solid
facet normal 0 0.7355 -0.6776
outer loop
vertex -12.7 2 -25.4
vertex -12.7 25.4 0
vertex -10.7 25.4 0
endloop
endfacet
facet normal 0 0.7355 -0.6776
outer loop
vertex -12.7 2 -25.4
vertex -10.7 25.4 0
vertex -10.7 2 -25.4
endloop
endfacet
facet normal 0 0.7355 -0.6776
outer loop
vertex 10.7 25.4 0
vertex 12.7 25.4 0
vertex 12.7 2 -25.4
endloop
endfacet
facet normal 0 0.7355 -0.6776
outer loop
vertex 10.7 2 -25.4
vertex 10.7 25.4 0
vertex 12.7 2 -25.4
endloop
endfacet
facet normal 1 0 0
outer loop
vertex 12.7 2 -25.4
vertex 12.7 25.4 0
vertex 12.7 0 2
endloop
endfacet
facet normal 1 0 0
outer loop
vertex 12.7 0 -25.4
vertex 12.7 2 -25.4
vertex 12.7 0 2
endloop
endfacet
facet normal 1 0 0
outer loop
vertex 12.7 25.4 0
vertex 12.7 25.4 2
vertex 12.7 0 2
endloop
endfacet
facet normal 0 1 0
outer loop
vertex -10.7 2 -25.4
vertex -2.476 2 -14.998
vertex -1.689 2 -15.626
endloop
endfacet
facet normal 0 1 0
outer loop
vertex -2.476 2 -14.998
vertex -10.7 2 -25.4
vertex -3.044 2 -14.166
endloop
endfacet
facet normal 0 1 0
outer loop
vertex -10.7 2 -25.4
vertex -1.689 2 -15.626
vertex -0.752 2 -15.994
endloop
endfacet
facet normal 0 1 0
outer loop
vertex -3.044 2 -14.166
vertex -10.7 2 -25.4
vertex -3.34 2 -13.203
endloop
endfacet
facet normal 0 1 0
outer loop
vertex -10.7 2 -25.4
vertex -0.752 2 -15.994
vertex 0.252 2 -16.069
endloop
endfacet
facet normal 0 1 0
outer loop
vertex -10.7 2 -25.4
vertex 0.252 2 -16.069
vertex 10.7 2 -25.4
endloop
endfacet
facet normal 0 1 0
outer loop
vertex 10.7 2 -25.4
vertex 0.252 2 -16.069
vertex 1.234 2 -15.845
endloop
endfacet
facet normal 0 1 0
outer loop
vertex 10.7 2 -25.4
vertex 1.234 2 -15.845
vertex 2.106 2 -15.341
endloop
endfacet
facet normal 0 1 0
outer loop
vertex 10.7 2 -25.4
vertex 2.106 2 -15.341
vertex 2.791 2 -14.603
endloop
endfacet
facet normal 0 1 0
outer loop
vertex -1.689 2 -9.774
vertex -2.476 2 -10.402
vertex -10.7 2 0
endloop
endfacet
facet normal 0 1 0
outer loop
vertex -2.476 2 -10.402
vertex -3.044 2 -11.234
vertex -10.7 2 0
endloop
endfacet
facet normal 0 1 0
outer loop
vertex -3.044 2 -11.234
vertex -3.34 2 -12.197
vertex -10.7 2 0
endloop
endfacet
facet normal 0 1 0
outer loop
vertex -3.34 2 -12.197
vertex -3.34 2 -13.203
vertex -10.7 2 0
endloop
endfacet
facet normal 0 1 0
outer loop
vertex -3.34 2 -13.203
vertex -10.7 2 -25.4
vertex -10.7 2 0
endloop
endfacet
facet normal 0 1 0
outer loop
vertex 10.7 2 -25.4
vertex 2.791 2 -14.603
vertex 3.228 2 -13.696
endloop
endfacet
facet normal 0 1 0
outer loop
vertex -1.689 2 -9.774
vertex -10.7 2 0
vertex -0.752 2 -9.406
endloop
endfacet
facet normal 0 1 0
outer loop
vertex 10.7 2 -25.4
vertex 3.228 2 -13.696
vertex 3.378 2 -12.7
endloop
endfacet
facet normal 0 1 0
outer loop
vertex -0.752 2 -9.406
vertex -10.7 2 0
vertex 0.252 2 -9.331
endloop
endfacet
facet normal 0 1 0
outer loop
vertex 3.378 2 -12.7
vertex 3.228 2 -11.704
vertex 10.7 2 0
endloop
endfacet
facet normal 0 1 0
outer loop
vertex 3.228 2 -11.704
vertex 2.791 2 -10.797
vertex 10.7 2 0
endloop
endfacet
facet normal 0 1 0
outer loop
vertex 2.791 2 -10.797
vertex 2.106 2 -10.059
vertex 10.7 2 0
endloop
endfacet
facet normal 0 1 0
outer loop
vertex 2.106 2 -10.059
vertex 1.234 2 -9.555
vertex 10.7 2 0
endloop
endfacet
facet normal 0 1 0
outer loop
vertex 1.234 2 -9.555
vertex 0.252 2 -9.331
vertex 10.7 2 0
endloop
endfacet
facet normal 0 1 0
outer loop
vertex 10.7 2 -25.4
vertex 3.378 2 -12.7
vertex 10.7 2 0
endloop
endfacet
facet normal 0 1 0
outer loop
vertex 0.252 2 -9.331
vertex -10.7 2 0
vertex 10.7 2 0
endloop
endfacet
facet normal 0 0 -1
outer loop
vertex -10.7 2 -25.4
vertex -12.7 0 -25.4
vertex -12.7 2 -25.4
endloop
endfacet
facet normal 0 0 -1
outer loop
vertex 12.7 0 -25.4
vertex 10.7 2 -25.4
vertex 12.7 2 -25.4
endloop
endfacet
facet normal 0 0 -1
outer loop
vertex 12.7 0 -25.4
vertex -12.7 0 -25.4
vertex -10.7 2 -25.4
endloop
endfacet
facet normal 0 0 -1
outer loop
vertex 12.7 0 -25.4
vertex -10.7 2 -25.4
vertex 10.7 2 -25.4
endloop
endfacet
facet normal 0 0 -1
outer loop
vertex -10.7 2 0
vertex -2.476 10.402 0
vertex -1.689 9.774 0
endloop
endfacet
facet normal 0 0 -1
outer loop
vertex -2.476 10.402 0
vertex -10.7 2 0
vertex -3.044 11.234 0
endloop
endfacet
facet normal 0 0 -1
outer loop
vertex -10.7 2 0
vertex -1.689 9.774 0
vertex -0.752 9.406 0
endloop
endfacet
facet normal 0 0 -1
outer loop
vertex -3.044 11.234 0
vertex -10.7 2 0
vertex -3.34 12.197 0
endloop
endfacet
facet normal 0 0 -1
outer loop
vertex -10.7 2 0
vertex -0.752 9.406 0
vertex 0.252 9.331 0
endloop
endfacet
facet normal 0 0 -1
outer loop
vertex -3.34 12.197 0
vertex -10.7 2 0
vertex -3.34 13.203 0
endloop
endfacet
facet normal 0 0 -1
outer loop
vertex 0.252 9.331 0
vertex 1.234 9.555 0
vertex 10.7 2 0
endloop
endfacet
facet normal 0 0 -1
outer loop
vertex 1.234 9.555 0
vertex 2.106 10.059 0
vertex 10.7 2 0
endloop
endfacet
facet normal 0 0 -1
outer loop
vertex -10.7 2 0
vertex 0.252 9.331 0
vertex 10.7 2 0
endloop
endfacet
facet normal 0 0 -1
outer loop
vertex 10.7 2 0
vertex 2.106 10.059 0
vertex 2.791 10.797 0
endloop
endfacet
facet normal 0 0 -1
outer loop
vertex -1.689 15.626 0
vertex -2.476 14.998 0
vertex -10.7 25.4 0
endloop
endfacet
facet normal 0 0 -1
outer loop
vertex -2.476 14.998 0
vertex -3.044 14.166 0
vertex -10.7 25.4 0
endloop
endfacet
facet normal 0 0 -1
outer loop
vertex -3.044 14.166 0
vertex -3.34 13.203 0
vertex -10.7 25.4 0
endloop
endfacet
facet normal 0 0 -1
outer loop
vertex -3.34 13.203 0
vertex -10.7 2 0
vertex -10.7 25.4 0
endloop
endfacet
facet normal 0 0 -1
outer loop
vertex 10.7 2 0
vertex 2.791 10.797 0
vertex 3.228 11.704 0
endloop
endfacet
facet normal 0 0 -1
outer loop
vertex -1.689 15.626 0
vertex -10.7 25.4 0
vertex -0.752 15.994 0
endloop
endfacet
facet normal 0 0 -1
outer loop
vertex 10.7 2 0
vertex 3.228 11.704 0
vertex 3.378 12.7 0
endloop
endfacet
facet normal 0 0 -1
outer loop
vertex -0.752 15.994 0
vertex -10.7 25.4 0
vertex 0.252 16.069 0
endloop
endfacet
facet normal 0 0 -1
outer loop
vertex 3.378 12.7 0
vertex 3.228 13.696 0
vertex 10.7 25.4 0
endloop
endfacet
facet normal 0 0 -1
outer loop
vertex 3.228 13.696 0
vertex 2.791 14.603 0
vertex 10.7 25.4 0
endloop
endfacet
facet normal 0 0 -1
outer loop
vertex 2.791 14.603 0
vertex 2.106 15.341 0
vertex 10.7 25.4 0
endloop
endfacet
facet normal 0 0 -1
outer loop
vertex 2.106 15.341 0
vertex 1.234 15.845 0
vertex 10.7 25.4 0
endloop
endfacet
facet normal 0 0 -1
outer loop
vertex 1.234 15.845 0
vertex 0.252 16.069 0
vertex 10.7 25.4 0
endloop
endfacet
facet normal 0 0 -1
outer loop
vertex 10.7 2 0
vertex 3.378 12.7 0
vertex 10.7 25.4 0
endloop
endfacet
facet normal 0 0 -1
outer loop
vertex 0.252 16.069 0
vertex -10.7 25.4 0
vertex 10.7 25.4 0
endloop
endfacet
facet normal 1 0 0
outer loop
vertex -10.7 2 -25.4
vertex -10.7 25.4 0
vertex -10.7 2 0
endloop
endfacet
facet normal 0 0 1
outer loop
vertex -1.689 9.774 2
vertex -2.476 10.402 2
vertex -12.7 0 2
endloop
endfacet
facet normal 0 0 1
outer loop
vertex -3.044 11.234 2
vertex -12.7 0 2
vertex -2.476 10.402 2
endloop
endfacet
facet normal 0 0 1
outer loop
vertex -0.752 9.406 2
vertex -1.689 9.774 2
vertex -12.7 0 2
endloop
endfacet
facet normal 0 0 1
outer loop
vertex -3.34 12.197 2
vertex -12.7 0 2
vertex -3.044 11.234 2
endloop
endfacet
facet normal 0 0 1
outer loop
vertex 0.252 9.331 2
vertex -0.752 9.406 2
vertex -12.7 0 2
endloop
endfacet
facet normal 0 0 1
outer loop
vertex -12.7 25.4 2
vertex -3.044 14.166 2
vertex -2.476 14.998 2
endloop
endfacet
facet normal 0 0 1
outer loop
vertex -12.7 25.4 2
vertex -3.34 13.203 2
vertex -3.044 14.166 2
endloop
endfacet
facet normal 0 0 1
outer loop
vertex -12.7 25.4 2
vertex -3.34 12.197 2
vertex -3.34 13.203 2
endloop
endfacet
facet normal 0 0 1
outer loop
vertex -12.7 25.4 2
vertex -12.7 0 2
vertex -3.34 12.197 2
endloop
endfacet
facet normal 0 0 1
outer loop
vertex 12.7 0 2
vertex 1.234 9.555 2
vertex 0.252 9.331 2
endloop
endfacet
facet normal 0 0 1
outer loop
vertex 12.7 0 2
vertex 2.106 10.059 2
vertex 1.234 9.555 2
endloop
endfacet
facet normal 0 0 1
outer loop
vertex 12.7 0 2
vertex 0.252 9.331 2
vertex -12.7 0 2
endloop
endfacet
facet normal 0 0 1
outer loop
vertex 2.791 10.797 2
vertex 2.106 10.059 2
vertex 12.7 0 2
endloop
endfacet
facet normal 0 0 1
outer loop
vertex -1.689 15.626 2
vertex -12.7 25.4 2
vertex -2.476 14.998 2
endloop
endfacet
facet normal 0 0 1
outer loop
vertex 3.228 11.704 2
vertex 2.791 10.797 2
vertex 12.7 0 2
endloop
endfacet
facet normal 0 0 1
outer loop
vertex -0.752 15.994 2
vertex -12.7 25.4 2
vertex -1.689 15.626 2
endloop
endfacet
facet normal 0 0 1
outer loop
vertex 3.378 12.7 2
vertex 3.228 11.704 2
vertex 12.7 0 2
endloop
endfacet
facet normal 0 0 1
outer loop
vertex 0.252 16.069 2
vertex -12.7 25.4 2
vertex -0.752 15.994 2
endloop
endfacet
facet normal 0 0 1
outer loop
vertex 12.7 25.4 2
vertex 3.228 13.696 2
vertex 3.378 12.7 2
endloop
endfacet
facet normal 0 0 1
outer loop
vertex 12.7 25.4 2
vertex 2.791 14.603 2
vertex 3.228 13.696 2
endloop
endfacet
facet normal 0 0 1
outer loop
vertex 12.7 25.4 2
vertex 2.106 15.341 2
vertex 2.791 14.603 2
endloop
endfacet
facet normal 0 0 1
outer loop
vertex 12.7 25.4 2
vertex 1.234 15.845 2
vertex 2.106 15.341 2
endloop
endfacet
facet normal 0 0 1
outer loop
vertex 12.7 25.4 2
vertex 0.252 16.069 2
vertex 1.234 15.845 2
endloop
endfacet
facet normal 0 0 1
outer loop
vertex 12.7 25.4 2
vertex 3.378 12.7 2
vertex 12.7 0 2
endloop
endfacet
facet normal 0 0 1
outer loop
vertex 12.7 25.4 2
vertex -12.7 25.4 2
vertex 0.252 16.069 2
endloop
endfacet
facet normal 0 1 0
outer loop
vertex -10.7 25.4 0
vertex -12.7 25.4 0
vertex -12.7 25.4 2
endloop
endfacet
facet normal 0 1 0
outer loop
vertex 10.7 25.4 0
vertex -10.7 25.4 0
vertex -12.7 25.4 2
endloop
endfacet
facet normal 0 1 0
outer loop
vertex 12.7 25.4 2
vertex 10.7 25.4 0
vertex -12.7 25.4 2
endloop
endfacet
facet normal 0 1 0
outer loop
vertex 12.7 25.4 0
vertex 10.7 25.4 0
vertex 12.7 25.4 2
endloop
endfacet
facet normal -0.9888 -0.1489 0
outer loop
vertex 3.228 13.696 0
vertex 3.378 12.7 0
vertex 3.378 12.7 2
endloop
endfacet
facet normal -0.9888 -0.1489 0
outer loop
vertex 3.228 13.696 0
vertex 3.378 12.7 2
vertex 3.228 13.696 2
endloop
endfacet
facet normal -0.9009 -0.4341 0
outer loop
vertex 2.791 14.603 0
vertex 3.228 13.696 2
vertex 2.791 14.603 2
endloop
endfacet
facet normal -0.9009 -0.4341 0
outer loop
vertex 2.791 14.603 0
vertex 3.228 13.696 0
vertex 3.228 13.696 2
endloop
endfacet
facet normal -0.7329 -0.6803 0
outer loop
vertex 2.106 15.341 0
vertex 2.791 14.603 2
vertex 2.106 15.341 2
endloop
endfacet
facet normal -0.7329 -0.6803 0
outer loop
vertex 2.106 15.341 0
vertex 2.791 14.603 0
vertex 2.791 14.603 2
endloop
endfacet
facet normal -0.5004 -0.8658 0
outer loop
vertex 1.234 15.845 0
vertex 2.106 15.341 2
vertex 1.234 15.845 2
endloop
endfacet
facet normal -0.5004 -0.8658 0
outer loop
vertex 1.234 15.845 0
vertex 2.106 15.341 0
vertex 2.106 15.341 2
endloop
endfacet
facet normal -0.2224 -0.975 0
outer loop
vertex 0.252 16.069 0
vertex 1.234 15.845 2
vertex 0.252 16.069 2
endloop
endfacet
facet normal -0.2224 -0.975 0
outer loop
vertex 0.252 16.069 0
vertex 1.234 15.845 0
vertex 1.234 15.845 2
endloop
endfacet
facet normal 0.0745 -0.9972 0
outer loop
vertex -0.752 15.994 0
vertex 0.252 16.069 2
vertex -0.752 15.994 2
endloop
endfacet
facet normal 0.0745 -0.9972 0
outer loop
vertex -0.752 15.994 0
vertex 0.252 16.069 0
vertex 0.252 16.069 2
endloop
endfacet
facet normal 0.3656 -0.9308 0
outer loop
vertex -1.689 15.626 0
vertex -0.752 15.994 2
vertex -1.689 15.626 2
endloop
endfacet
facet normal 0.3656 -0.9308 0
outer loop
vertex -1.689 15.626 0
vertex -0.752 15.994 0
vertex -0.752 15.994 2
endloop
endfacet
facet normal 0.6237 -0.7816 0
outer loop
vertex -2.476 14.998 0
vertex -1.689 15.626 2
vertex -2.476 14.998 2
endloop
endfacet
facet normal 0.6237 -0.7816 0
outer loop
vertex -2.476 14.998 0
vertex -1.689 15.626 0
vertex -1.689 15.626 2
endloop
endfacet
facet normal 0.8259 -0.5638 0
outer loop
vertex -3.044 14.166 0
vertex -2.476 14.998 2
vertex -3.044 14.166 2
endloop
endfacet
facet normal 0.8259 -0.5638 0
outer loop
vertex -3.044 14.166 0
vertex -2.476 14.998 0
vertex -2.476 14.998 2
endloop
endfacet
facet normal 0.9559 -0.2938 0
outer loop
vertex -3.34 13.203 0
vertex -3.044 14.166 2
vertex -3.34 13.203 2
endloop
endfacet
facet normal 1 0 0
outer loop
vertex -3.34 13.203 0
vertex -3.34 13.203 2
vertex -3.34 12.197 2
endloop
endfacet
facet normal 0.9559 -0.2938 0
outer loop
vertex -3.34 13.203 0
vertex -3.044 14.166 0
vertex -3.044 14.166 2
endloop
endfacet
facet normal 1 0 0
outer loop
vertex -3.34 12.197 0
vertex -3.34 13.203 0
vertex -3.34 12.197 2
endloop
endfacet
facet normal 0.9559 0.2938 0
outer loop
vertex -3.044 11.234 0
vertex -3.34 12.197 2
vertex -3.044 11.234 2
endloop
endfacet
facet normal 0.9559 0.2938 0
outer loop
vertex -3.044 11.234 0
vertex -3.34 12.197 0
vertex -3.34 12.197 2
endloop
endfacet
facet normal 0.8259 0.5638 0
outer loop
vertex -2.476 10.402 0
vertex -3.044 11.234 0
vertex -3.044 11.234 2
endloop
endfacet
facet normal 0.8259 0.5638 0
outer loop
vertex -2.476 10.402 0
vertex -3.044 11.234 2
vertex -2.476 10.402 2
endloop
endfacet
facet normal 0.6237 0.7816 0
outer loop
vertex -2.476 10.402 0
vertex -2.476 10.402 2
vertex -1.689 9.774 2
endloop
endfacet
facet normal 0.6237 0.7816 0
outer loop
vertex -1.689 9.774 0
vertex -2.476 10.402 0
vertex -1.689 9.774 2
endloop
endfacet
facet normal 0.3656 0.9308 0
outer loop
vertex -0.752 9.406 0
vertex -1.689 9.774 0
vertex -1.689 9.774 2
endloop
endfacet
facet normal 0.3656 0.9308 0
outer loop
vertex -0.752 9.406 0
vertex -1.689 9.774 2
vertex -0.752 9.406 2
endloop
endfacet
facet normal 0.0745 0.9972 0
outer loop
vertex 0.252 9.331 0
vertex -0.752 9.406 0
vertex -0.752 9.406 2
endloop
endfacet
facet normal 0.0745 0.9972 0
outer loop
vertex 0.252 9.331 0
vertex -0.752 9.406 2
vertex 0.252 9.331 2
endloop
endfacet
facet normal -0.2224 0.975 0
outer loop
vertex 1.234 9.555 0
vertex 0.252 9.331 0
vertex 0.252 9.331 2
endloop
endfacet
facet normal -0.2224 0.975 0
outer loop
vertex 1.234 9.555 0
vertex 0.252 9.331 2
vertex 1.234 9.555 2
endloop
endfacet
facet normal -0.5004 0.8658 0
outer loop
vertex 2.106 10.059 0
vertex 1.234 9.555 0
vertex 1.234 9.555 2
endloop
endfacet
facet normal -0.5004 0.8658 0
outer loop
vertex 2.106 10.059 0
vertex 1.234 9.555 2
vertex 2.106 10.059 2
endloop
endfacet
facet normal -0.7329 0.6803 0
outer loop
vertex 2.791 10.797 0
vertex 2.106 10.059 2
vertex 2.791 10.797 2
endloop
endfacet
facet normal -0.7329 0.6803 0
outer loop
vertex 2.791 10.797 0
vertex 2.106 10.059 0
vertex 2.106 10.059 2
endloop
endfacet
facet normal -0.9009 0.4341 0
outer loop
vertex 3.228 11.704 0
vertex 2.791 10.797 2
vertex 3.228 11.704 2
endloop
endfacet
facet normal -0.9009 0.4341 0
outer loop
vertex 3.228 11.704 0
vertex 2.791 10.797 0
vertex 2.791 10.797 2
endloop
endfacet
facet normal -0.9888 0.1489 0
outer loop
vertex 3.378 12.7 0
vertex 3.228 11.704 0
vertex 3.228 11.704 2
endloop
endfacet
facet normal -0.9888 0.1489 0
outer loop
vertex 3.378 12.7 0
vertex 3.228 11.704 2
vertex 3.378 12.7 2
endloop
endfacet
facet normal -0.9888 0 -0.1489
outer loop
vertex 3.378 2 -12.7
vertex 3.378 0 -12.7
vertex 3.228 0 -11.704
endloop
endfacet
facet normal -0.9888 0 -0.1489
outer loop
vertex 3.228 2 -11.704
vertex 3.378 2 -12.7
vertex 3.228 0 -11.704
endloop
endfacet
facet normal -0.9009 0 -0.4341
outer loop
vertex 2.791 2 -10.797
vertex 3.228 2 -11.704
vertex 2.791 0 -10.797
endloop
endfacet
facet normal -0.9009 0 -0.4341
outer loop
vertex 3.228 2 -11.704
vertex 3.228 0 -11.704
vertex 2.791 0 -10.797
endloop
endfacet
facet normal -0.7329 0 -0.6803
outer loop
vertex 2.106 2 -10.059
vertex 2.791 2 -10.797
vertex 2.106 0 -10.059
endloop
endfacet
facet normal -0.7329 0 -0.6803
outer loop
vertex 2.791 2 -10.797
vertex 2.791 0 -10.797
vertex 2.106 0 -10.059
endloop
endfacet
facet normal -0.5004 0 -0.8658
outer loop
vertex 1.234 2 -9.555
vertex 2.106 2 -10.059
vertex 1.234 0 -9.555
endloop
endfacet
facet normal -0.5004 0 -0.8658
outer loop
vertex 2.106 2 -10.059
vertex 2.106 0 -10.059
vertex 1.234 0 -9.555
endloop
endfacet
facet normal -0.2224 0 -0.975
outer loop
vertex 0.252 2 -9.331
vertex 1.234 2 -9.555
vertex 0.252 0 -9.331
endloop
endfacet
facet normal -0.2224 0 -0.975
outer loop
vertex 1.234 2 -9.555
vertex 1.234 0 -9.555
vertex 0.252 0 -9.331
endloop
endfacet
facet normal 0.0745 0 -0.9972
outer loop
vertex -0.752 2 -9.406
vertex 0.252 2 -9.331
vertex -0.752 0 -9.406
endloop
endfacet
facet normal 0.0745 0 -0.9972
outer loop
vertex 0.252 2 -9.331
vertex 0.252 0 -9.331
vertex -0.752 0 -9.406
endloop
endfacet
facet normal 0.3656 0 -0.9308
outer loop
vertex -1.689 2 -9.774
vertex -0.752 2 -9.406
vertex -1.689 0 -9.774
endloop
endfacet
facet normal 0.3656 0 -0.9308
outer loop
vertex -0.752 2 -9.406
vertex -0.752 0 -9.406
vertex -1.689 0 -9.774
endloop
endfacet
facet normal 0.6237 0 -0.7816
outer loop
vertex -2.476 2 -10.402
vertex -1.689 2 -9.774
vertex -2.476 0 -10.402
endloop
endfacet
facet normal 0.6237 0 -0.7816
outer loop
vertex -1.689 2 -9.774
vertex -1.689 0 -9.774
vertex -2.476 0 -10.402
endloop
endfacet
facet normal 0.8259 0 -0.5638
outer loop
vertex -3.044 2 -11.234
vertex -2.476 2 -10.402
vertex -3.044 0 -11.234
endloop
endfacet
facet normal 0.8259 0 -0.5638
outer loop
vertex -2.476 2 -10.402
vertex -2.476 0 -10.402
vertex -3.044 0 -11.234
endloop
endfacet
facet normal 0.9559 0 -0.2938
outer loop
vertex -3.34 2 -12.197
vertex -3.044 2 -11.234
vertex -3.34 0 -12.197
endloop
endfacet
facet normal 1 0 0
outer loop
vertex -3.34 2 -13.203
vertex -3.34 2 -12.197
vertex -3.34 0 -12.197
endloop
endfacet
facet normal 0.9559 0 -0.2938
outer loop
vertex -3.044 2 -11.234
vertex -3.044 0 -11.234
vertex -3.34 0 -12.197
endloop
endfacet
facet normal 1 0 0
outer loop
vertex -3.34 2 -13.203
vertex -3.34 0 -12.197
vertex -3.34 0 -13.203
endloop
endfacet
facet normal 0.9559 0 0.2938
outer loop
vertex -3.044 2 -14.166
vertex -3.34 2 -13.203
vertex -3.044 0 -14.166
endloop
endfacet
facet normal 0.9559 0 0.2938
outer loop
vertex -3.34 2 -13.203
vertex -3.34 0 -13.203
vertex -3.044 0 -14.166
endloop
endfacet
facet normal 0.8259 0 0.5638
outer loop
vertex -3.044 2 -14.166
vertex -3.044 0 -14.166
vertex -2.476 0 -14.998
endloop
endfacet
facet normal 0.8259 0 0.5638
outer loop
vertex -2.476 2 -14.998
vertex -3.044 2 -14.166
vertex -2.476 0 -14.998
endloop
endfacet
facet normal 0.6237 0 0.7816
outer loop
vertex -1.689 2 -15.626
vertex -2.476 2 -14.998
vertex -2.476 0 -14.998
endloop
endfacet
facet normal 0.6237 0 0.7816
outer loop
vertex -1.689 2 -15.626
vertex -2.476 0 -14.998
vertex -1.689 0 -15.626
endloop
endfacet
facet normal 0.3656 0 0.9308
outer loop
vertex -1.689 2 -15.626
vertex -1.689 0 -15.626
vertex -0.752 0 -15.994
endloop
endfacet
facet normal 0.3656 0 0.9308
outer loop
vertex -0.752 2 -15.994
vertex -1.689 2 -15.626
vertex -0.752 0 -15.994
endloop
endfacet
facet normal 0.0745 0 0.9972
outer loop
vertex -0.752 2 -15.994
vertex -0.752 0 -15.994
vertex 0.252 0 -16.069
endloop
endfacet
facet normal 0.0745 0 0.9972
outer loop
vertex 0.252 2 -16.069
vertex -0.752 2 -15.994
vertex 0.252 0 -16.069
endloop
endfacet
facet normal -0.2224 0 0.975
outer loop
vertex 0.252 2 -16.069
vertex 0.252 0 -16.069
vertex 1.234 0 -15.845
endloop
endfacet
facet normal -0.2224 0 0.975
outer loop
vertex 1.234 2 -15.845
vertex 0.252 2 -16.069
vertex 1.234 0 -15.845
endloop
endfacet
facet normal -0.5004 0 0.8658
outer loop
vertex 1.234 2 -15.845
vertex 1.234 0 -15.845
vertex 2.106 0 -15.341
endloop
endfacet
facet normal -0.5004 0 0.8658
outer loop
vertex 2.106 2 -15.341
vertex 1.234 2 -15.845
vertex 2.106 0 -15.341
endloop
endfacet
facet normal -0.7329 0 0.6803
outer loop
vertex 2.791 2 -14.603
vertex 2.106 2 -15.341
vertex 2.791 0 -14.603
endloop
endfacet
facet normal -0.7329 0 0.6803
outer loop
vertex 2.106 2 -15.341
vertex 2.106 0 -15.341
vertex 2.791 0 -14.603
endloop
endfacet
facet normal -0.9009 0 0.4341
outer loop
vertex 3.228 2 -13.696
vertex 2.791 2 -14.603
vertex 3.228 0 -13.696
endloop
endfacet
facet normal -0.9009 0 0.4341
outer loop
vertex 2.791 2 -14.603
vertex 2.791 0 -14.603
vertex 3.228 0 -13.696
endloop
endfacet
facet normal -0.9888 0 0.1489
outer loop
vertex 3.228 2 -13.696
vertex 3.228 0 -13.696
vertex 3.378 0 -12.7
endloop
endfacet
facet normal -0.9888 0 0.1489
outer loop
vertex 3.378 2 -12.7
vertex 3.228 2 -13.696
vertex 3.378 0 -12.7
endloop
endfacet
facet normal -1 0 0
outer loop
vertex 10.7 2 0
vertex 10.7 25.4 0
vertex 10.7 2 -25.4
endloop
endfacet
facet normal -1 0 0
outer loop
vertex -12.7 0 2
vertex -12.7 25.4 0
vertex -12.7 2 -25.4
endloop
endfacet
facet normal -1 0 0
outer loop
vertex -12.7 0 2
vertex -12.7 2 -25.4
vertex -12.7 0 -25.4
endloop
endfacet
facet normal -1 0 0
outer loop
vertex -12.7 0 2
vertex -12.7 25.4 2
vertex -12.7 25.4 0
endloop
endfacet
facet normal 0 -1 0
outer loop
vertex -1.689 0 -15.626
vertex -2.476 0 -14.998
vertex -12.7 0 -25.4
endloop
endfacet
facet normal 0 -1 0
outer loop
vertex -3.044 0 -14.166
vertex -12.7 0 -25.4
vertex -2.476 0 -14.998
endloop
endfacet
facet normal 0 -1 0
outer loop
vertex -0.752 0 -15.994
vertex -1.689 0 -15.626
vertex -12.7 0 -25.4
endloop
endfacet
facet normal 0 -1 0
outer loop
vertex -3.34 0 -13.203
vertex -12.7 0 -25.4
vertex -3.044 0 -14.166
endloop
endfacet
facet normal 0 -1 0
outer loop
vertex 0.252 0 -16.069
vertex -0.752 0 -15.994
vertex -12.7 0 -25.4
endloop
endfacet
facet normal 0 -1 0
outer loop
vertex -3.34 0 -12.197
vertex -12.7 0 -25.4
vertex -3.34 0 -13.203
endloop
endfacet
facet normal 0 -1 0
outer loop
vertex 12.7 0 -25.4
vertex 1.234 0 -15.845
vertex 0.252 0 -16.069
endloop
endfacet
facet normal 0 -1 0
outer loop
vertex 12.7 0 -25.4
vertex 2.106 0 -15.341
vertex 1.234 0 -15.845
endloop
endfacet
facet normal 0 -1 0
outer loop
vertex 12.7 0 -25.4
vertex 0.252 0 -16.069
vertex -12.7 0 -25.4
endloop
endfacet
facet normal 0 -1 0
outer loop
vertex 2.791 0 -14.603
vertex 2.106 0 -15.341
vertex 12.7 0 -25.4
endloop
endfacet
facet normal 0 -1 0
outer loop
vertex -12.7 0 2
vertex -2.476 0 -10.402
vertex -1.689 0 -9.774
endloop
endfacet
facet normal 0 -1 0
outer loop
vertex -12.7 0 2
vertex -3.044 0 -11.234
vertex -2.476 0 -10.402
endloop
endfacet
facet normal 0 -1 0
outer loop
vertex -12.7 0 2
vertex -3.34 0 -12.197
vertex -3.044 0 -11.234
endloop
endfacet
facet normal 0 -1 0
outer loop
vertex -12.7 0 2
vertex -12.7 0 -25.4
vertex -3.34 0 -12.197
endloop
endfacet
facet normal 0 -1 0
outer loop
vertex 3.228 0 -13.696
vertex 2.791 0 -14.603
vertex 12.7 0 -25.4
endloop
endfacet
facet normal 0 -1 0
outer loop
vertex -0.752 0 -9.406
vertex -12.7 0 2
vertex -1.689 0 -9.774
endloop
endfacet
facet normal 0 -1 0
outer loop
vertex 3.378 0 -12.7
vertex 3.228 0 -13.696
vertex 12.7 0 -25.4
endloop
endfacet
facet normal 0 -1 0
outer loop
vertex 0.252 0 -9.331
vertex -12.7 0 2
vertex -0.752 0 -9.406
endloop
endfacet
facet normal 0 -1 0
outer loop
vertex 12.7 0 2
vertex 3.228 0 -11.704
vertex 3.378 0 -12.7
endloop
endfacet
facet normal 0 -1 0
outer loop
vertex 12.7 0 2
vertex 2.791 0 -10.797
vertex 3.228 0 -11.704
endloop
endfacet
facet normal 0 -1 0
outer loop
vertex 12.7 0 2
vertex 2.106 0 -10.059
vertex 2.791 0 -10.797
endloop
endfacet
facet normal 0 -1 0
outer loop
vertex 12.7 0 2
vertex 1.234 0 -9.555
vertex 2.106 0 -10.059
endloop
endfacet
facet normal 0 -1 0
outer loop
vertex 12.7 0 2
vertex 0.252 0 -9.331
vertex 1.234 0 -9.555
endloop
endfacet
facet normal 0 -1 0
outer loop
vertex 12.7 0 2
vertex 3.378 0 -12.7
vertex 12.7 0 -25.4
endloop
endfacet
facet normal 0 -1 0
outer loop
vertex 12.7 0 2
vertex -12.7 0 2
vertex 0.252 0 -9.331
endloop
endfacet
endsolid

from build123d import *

# Parameters (mm, degrees)
SKETCH_W     = 25.4
SKETCH_H     = 25.4
SKETCH_R     = 3.3782
PAD_DEPTH    = 2
SKETCH001_W  = 25.4
SKETCH001_H  = 25.4
SKETCH001_R  = 3.3782
PAD001_DEPTH = 2
PAD002_DEPTH = 2


with BuildPart() as part:
    # Sketch → Pad (new body)
    with BuildSketch(Plane.XY):
        with Locations((0, 12.7)):
            Rectangle(SKETCH_W, SKETCH_H)
        with Locations((0, 12.7)):
            Circle(SKETCH_R, mode=Mode.SUBTRACT)
    extrude(amount=PAD_DEPTH)

    # Sketch001 → Pad001 (join)
    with BuildSketch(Plane.XZ):
        with Locations((0, -12.7)):
            Rectangle(SKETCH001_W, SKETCH001_H)
        with Locations((0, -12.7)):
            Circle(SKETCH001_R, mode=Mode.SUBTRACT)
    extrude(amount=-PAD001_DEPTH)

    # Sketch002 (on Face9 of Pad001) → Pad002 (join)
    with BuildSketch(Plane.YZ.offset(12.7)):
        Polygon((2, -25.4), (2, 0), (25.4, 0), align=None)
    pad002 = extrude(amount=-PAD002_DEPTH)

    # Mirrored: Pad002 across YZ
    add(pad002.mirror(Plane.YZ))


solid = part.part
